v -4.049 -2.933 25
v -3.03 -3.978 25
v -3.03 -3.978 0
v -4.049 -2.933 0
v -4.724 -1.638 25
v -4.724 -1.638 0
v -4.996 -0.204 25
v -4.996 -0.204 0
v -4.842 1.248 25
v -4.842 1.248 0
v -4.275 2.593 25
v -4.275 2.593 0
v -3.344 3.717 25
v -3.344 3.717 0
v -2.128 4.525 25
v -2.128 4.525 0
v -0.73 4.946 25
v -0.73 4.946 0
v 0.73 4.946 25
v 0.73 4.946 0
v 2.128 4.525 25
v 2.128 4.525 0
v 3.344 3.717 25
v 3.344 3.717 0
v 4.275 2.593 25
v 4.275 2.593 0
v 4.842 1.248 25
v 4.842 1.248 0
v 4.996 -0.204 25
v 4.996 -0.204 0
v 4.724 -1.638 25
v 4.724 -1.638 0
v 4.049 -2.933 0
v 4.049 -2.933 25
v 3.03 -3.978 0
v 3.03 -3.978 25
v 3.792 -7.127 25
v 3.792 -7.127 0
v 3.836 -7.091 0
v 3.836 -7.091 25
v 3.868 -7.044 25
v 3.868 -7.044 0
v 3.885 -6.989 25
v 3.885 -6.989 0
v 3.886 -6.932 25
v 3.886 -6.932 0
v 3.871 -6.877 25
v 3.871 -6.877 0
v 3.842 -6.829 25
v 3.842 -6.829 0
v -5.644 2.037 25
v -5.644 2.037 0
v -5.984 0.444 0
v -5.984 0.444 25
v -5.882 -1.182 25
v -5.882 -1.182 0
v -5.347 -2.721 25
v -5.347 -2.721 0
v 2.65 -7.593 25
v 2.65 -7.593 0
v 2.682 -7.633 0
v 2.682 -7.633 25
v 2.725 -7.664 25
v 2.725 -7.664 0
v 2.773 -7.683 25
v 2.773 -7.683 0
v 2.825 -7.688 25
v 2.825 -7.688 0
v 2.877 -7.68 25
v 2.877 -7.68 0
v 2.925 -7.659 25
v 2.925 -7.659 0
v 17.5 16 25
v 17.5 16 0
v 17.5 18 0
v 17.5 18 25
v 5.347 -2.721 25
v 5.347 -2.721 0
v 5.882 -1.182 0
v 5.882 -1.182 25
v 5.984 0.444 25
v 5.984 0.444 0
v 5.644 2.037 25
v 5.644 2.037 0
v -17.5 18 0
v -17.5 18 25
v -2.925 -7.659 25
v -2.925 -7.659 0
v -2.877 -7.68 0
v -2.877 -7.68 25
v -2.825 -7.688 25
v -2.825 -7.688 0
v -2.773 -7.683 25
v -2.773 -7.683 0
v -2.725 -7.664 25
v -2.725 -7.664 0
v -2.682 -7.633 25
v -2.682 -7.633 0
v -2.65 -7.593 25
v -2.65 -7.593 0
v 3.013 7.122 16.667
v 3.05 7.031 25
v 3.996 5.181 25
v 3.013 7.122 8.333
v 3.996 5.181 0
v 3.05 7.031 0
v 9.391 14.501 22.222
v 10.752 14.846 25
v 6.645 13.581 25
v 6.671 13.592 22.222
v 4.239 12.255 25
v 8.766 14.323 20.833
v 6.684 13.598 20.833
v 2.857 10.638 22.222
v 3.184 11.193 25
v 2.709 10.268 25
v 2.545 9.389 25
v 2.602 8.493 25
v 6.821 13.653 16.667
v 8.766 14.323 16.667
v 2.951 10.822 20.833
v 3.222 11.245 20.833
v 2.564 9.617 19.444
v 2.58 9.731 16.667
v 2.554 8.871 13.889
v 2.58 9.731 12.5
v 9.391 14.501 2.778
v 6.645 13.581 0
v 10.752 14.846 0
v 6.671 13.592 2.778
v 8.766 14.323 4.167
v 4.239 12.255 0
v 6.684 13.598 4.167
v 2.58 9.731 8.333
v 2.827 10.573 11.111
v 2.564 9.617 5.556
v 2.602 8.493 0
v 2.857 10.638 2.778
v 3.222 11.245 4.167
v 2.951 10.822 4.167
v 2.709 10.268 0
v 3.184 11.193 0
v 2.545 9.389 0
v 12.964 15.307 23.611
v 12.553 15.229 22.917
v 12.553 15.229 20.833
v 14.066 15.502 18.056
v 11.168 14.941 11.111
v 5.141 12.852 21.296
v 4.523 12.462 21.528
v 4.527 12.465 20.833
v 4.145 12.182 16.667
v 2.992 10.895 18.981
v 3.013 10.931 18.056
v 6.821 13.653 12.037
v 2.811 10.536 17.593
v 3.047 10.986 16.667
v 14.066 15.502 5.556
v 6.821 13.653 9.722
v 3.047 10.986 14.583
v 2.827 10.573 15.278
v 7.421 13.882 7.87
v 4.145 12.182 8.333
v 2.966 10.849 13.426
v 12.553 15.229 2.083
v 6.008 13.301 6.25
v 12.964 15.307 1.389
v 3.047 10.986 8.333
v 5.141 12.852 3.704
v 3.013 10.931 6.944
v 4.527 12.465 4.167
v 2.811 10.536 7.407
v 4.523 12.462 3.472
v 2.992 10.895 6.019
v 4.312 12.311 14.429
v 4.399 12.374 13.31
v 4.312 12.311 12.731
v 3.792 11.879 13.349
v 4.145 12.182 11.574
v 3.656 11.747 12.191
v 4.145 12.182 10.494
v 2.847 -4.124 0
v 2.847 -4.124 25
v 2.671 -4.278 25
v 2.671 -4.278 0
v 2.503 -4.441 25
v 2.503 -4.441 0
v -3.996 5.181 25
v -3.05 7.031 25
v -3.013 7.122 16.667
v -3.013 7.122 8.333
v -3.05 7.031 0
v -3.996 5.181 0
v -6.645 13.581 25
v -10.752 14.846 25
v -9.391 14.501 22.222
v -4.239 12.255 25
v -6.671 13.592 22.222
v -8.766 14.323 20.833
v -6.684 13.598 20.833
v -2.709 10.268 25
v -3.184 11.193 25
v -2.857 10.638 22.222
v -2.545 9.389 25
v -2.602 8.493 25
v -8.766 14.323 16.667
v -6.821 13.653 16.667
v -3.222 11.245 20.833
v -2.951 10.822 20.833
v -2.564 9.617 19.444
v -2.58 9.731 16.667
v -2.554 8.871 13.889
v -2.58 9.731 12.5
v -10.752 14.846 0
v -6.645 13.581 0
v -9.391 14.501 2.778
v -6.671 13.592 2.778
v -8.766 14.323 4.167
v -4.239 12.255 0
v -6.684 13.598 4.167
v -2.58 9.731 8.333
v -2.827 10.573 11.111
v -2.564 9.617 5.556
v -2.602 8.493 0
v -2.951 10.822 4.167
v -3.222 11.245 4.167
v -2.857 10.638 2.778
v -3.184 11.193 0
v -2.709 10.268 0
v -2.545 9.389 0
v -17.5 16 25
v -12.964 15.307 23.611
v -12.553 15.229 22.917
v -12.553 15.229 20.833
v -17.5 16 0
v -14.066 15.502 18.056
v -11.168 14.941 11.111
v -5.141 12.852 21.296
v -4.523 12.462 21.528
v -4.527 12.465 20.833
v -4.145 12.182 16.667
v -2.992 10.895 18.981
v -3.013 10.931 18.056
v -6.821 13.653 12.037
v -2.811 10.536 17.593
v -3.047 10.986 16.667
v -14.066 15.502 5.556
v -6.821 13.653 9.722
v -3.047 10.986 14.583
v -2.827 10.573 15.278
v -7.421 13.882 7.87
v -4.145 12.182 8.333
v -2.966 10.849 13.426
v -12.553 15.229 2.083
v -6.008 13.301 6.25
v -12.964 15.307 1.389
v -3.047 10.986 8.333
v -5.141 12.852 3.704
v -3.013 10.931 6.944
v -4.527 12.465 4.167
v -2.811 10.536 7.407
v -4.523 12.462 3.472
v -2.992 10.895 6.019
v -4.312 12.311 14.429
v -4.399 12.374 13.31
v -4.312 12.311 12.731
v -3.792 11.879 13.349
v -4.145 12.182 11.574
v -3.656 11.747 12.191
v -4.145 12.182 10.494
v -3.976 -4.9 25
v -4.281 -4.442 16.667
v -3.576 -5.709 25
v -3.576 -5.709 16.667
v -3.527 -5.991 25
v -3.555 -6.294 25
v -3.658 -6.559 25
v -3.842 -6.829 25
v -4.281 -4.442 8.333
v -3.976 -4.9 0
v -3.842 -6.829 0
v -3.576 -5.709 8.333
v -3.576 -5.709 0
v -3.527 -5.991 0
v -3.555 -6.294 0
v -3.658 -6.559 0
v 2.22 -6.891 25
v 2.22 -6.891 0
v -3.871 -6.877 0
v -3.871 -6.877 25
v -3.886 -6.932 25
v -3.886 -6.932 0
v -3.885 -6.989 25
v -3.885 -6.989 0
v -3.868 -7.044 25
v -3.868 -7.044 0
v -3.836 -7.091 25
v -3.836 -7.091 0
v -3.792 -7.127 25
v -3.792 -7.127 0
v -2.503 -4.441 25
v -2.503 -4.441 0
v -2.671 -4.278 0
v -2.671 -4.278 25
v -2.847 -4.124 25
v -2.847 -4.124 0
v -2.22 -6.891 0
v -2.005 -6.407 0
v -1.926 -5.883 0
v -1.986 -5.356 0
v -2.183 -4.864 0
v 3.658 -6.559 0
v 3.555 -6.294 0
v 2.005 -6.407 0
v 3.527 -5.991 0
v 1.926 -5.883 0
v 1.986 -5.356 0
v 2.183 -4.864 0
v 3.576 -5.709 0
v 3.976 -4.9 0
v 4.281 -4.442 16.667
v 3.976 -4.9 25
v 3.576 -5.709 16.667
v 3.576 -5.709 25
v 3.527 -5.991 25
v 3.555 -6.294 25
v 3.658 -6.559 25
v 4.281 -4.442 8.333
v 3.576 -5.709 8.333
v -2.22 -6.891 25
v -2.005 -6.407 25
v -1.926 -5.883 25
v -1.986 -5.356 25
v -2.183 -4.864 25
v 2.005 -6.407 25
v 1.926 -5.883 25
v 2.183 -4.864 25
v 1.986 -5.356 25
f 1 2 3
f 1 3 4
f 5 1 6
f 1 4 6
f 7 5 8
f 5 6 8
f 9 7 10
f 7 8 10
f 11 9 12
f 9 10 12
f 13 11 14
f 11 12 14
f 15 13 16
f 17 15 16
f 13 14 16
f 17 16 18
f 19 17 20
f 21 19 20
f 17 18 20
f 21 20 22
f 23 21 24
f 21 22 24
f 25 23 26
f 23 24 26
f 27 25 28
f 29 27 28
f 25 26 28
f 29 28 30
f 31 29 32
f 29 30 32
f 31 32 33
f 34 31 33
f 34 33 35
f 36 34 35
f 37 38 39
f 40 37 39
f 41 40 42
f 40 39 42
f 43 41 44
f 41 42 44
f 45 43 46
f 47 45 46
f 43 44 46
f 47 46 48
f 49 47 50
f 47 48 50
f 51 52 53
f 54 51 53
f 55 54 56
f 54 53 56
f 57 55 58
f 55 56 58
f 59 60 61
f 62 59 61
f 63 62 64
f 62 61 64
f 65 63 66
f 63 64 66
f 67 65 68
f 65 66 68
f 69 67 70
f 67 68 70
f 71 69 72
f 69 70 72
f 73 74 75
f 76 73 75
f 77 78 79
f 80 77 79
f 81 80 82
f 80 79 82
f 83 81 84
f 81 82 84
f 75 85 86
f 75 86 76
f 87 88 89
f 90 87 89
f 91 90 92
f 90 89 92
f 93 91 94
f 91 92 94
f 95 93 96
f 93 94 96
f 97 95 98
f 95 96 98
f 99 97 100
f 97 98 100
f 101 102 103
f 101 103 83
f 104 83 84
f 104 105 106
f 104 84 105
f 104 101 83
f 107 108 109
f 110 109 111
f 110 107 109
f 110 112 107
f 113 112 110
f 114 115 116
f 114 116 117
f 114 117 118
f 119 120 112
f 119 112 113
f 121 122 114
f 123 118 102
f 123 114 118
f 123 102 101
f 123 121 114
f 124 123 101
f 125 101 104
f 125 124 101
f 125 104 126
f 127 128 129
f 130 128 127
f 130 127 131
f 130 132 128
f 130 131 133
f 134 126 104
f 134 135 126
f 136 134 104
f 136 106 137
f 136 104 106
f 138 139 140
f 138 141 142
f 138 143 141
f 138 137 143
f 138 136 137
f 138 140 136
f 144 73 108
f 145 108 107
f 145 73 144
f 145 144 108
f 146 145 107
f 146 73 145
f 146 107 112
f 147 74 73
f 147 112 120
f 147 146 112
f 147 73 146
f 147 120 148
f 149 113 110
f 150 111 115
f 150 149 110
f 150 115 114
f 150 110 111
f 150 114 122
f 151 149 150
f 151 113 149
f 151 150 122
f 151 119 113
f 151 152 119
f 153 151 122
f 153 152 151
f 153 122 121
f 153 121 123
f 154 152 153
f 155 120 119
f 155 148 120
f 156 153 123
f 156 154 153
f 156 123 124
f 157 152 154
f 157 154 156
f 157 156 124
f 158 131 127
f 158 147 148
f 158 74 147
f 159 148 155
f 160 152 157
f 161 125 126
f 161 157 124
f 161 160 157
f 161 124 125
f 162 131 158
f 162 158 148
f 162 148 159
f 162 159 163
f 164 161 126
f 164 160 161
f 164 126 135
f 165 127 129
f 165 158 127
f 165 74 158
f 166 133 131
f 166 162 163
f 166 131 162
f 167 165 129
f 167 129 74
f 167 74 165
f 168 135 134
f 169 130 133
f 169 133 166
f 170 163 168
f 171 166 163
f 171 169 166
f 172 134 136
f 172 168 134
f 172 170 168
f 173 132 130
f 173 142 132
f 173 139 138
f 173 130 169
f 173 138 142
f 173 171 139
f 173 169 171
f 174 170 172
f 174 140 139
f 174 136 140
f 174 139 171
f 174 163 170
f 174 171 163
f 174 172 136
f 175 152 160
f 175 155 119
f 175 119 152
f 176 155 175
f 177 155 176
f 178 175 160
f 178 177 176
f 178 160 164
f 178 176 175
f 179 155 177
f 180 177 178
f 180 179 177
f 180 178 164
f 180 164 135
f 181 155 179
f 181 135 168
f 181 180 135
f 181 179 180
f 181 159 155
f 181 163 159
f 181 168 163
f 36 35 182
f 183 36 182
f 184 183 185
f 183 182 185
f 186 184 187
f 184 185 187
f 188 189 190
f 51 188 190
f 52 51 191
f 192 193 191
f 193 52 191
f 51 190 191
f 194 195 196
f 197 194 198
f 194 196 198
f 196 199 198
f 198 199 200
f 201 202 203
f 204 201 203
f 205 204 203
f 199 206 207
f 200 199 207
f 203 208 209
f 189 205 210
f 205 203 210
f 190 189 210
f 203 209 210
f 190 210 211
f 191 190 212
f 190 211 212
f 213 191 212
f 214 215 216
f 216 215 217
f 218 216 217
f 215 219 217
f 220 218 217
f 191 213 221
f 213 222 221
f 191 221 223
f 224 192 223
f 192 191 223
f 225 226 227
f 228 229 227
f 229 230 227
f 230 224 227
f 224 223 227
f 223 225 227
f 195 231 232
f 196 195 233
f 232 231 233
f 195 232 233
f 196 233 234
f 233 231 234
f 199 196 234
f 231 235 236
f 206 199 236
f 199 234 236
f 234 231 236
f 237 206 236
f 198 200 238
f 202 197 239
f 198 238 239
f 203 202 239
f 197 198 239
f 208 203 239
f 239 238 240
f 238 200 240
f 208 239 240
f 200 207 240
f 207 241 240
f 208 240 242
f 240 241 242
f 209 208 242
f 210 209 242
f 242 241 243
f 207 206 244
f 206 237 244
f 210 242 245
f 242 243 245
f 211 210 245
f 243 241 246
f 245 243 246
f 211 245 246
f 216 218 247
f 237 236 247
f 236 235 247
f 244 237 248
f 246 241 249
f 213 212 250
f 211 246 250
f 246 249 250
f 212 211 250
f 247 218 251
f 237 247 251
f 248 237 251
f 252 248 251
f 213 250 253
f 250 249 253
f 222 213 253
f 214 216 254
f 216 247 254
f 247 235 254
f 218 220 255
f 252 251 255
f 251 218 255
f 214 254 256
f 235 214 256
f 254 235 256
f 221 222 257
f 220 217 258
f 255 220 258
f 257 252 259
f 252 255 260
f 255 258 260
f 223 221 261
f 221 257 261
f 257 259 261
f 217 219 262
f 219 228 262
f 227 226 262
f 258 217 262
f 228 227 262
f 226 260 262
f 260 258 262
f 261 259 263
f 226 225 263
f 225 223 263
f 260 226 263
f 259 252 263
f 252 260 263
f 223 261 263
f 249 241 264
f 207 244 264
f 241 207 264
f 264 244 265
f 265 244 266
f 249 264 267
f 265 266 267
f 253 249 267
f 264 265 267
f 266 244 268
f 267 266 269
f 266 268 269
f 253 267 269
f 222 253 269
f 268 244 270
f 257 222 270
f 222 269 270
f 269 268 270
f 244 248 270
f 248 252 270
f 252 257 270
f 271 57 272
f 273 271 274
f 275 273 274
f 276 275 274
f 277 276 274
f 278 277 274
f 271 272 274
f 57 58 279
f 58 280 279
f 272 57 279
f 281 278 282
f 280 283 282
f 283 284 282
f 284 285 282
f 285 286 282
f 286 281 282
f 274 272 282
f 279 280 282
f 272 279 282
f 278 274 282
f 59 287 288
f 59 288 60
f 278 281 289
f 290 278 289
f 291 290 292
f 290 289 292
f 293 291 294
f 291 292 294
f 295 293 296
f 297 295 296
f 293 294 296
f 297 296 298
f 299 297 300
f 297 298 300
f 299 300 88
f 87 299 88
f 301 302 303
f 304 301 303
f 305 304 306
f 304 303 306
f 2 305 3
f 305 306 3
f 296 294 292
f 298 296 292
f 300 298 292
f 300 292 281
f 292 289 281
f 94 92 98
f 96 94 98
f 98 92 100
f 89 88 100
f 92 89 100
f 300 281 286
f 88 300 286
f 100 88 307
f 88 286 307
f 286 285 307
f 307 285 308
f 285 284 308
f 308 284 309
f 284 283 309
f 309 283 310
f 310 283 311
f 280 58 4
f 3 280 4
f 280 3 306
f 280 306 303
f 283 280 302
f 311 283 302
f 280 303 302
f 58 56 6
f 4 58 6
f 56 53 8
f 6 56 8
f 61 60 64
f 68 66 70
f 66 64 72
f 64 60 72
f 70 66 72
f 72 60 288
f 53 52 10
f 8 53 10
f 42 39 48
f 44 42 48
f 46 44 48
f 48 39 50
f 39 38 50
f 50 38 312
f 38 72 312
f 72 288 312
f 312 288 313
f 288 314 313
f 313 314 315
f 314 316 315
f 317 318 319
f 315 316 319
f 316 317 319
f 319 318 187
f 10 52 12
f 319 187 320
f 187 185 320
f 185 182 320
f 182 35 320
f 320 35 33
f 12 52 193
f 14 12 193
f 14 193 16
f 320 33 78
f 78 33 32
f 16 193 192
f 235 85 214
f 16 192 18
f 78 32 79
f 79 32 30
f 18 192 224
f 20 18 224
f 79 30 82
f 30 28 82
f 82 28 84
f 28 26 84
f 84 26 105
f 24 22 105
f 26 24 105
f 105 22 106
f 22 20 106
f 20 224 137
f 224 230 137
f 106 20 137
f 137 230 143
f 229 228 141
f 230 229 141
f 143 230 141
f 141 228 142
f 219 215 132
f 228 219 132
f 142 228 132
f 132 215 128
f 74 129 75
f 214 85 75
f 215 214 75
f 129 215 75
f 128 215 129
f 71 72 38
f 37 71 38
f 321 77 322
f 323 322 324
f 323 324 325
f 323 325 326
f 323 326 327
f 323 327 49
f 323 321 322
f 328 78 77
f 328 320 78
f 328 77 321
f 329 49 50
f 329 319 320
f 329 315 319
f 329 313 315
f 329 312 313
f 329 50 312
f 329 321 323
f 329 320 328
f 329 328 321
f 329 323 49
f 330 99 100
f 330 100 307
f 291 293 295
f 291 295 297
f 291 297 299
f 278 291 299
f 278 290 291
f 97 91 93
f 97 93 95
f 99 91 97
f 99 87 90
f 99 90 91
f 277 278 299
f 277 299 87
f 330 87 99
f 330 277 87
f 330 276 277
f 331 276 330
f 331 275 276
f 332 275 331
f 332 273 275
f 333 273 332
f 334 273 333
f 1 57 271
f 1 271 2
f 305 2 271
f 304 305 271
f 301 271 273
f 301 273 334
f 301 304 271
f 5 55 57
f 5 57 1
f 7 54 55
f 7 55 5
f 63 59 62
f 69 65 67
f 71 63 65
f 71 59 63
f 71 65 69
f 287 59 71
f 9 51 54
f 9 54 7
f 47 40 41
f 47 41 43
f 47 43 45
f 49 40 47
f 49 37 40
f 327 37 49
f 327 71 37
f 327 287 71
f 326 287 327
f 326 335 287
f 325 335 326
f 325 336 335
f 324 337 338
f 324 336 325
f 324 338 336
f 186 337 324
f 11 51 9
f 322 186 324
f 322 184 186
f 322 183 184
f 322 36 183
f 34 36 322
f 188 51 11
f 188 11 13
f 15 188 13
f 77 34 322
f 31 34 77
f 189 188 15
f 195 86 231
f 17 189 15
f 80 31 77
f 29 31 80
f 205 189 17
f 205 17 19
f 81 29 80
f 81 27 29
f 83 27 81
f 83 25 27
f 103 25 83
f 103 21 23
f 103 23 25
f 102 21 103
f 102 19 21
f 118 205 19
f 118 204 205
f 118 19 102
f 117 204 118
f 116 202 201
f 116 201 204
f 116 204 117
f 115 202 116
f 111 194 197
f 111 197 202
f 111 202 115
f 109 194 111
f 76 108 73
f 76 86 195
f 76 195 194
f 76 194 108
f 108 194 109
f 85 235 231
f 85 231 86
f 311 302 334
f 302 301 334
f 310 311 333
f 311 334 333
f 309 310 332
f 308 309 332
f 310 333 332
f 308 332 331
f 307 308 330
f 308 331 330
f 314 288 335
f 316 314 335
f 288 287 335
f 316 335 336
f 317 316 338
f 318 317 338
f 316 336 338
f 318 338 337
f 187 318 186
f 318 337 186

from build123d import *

# Parameters (mm, degrees)
F0_W        = 35
F0_H        = 2
F1_DEPTH    = 25
F2_T1_DEPTH = 33.357808199
F3_R        = 2


# Not quite as in the source:
# - a fillet or chamfer that OpenCascade refuses, or shapes differently, is made with other operations: its cross-section is extruded or revolved along the edge and cut away or added


with BuildPart() as f1:
    # F0 (on Top) → F1 (new body)
    with BuildSketch(Plane.XY):
        with Locations((0, 17)):
            Rectangle(F0_W, F0_H)
        with BuildLine():
            ThreePointArc((-5.6435050377, 2.0373637106), (0, 6), (5.6435050377, 2.0373637106))
            add(Edge.make_bspline(
                [(17.5, 16), (-4.7855940647, 13.2096234411), (3.9503478981, 6.7274152696), (5.6435050377, 2.0373637106)],
                knots=[0, 0, 0, 0, 18.317523985, 18.317523985, 18.317523985, 18.317523985], degree=3))
            Line((17.5, 16), (-17.5, 16))
            add(Edge.make_bspline(
                [(-17.5, 16), (4.7855940647, 13.2096234411), (-3.9503478981, 6.7274152696), (-5.6435050377, 2.0373637106)],
                knots=[0, 0, 0, 0, 18.317523985, 18.317523985, 18.317523985, 18.317523985], degree=3))
        make_face()
        with BuildLine():
            ThreePointArc((-1.5493444278, -4.7538964907), (0, 5), (1.5493444278, -4.7538964907))
            Line((1.5493444278, -4.7538964907), (1.5493444278, -5.7965103161))
            ThreePointArc((1.5493444278, -5.7965103161), (3.7756538243, -4.6630932007), (5.3474024613, -2.7212656829))
            ThreePointArc((5.3474024613, -2.7212656829), (5.9884180164, -0.3726253627), (5.6435050377, 2.0373637106))
            ThreePointArc((5.6435050377, 2.0373637106), (0, 6), (-5.6435050377, 2.0373637106))
            ThreePointArc((-5.6435050377, 2.0373637106), (-5.9884180164, -0.3726253627), (-5.3474024613, -2.7212656829))
            ThreePointArc((-5.3474024613, -2.7212656829), (-3.7756538243, -4.6630932007), (-1.5493444278, -5.7965103161))
            Line((-1.5493444278, -5.7965103161), (-1.5493444278, -4.7538964907))
        make_face()
        with BuildLine():
            Line((-2.6496251192, -7.5926648612), (-1.5493444278, -5.7965103161))
            ThreePointArc((-1.5493444278, -5.7965103161), (-3.7756538243, -4.6630932007), (-5.3474024613, -2.7212656829))
            add(Edge.make_bspline(
                [(-5.3474024613, -2.7212656829), (-4.3048003044, -4.7700231324), (-2.8869232094, -5.6816728311), (-3.8415154138, -6.828782889)],
                knots=[0, 0, 0, 0, 4.2754829053, 4.2754829053, 4.2754829053, 4.2754829053], degree=3))
            ThreePointArc((-3.8415154138, -6.828782889), (-3.8851139698, -6.989281561), (-3.7922551547, -7.1272594514))
            Line((-3.7922551547, -7.1272594514), (-2.9246420572, -7.6587381827))
            ThreePointArc((-2.9246420572, -7.6587381827), (-2.7734493553, -7.6826593947), (-2.6496251192, -7.5926648612))
        make_face()
        with BuildLine():
            ThreePointArc((5.3474024613, -2.7212656829), (3.7756538243, -4.6630932007), (1.5493444278, -5.7965103161))
            Line((1.5493444278, -5.7965103161), (2.6496251192, -7.5926648612))
            ThreePointArc((2.6496251192, -7.5926648612), (2.7734493553, -7.6826593947), (2.9246420572, -7.6587381827))
            Line((2.9246420572, -7.6587381827), (3.7922551547, -7.1272594514))
            ThreePointArc((3.7922551547, -7.1272594514), (3.8851139698, -6.989281561), (3.8415154138, -6.828782889))
            add(Edge.make_bspline(
                [(5.3474024613, -2.7212656829), (4.3048003044, -4.7700231324), (2.8869232094, -5.6816728311), (3.8415154138, -6.828782889)],
                knots=[0, 0, 0, 0, 4.2754829053, 4.2754829053, 4.2754829053, 4.2754829053], degree=3))
        make_face()
    extrude(amount=F1_DEPTH)

    # F2: fillet of radius 5 on 2 edges, made by hand

    # F2_s2 → F2_t1 (cut)
    with BuildSketch(Plane.XY.offset(-4.1789040995)):
        with BuildLine():
            ThreePointArc((-1.5493444278, -5.7965103161), (-2.1813631769, -4.7990149212), (-3.0296890274, -3.9775601061))
            ThreePointArc((-3.0296890274, -3.9775601061), (-2.3221889224, -4.4280287498), (-1.5493444278, -4.7538964907))
            Line((-1.5493444278, -4.7538964907), (-1.5493444278, -5.7965103161))
        make_face()
        with BuildLine():
            ThreePointArc((3.0296890274, -3.9775601061), (2.1813631769, -4.7990149212), (1.5493444278, -5.7965103161))
            Line((1.5493444278, -5.7965103161), (1.5493444278, -4.7538964907))
            ThreePointArc((1.5493444278, -4.7538964907), (2.3221889224, -4.4280287498), (3.0296890274, -3.9775601061))
        make_face()
    extrude(amount=F2_T1_DEPTH, mode=Mode.SUBTRACT)

    # F3
    f3_edges = [f1.edges().sort_by_distance(p)[0] for p in [
        (-1.549344, -5.79651, 12.5),
        (1.549344, -5.79651, 12.5),
    ]]
    fillet(f3_edges, radius=F3_R)


solid = f1.part
